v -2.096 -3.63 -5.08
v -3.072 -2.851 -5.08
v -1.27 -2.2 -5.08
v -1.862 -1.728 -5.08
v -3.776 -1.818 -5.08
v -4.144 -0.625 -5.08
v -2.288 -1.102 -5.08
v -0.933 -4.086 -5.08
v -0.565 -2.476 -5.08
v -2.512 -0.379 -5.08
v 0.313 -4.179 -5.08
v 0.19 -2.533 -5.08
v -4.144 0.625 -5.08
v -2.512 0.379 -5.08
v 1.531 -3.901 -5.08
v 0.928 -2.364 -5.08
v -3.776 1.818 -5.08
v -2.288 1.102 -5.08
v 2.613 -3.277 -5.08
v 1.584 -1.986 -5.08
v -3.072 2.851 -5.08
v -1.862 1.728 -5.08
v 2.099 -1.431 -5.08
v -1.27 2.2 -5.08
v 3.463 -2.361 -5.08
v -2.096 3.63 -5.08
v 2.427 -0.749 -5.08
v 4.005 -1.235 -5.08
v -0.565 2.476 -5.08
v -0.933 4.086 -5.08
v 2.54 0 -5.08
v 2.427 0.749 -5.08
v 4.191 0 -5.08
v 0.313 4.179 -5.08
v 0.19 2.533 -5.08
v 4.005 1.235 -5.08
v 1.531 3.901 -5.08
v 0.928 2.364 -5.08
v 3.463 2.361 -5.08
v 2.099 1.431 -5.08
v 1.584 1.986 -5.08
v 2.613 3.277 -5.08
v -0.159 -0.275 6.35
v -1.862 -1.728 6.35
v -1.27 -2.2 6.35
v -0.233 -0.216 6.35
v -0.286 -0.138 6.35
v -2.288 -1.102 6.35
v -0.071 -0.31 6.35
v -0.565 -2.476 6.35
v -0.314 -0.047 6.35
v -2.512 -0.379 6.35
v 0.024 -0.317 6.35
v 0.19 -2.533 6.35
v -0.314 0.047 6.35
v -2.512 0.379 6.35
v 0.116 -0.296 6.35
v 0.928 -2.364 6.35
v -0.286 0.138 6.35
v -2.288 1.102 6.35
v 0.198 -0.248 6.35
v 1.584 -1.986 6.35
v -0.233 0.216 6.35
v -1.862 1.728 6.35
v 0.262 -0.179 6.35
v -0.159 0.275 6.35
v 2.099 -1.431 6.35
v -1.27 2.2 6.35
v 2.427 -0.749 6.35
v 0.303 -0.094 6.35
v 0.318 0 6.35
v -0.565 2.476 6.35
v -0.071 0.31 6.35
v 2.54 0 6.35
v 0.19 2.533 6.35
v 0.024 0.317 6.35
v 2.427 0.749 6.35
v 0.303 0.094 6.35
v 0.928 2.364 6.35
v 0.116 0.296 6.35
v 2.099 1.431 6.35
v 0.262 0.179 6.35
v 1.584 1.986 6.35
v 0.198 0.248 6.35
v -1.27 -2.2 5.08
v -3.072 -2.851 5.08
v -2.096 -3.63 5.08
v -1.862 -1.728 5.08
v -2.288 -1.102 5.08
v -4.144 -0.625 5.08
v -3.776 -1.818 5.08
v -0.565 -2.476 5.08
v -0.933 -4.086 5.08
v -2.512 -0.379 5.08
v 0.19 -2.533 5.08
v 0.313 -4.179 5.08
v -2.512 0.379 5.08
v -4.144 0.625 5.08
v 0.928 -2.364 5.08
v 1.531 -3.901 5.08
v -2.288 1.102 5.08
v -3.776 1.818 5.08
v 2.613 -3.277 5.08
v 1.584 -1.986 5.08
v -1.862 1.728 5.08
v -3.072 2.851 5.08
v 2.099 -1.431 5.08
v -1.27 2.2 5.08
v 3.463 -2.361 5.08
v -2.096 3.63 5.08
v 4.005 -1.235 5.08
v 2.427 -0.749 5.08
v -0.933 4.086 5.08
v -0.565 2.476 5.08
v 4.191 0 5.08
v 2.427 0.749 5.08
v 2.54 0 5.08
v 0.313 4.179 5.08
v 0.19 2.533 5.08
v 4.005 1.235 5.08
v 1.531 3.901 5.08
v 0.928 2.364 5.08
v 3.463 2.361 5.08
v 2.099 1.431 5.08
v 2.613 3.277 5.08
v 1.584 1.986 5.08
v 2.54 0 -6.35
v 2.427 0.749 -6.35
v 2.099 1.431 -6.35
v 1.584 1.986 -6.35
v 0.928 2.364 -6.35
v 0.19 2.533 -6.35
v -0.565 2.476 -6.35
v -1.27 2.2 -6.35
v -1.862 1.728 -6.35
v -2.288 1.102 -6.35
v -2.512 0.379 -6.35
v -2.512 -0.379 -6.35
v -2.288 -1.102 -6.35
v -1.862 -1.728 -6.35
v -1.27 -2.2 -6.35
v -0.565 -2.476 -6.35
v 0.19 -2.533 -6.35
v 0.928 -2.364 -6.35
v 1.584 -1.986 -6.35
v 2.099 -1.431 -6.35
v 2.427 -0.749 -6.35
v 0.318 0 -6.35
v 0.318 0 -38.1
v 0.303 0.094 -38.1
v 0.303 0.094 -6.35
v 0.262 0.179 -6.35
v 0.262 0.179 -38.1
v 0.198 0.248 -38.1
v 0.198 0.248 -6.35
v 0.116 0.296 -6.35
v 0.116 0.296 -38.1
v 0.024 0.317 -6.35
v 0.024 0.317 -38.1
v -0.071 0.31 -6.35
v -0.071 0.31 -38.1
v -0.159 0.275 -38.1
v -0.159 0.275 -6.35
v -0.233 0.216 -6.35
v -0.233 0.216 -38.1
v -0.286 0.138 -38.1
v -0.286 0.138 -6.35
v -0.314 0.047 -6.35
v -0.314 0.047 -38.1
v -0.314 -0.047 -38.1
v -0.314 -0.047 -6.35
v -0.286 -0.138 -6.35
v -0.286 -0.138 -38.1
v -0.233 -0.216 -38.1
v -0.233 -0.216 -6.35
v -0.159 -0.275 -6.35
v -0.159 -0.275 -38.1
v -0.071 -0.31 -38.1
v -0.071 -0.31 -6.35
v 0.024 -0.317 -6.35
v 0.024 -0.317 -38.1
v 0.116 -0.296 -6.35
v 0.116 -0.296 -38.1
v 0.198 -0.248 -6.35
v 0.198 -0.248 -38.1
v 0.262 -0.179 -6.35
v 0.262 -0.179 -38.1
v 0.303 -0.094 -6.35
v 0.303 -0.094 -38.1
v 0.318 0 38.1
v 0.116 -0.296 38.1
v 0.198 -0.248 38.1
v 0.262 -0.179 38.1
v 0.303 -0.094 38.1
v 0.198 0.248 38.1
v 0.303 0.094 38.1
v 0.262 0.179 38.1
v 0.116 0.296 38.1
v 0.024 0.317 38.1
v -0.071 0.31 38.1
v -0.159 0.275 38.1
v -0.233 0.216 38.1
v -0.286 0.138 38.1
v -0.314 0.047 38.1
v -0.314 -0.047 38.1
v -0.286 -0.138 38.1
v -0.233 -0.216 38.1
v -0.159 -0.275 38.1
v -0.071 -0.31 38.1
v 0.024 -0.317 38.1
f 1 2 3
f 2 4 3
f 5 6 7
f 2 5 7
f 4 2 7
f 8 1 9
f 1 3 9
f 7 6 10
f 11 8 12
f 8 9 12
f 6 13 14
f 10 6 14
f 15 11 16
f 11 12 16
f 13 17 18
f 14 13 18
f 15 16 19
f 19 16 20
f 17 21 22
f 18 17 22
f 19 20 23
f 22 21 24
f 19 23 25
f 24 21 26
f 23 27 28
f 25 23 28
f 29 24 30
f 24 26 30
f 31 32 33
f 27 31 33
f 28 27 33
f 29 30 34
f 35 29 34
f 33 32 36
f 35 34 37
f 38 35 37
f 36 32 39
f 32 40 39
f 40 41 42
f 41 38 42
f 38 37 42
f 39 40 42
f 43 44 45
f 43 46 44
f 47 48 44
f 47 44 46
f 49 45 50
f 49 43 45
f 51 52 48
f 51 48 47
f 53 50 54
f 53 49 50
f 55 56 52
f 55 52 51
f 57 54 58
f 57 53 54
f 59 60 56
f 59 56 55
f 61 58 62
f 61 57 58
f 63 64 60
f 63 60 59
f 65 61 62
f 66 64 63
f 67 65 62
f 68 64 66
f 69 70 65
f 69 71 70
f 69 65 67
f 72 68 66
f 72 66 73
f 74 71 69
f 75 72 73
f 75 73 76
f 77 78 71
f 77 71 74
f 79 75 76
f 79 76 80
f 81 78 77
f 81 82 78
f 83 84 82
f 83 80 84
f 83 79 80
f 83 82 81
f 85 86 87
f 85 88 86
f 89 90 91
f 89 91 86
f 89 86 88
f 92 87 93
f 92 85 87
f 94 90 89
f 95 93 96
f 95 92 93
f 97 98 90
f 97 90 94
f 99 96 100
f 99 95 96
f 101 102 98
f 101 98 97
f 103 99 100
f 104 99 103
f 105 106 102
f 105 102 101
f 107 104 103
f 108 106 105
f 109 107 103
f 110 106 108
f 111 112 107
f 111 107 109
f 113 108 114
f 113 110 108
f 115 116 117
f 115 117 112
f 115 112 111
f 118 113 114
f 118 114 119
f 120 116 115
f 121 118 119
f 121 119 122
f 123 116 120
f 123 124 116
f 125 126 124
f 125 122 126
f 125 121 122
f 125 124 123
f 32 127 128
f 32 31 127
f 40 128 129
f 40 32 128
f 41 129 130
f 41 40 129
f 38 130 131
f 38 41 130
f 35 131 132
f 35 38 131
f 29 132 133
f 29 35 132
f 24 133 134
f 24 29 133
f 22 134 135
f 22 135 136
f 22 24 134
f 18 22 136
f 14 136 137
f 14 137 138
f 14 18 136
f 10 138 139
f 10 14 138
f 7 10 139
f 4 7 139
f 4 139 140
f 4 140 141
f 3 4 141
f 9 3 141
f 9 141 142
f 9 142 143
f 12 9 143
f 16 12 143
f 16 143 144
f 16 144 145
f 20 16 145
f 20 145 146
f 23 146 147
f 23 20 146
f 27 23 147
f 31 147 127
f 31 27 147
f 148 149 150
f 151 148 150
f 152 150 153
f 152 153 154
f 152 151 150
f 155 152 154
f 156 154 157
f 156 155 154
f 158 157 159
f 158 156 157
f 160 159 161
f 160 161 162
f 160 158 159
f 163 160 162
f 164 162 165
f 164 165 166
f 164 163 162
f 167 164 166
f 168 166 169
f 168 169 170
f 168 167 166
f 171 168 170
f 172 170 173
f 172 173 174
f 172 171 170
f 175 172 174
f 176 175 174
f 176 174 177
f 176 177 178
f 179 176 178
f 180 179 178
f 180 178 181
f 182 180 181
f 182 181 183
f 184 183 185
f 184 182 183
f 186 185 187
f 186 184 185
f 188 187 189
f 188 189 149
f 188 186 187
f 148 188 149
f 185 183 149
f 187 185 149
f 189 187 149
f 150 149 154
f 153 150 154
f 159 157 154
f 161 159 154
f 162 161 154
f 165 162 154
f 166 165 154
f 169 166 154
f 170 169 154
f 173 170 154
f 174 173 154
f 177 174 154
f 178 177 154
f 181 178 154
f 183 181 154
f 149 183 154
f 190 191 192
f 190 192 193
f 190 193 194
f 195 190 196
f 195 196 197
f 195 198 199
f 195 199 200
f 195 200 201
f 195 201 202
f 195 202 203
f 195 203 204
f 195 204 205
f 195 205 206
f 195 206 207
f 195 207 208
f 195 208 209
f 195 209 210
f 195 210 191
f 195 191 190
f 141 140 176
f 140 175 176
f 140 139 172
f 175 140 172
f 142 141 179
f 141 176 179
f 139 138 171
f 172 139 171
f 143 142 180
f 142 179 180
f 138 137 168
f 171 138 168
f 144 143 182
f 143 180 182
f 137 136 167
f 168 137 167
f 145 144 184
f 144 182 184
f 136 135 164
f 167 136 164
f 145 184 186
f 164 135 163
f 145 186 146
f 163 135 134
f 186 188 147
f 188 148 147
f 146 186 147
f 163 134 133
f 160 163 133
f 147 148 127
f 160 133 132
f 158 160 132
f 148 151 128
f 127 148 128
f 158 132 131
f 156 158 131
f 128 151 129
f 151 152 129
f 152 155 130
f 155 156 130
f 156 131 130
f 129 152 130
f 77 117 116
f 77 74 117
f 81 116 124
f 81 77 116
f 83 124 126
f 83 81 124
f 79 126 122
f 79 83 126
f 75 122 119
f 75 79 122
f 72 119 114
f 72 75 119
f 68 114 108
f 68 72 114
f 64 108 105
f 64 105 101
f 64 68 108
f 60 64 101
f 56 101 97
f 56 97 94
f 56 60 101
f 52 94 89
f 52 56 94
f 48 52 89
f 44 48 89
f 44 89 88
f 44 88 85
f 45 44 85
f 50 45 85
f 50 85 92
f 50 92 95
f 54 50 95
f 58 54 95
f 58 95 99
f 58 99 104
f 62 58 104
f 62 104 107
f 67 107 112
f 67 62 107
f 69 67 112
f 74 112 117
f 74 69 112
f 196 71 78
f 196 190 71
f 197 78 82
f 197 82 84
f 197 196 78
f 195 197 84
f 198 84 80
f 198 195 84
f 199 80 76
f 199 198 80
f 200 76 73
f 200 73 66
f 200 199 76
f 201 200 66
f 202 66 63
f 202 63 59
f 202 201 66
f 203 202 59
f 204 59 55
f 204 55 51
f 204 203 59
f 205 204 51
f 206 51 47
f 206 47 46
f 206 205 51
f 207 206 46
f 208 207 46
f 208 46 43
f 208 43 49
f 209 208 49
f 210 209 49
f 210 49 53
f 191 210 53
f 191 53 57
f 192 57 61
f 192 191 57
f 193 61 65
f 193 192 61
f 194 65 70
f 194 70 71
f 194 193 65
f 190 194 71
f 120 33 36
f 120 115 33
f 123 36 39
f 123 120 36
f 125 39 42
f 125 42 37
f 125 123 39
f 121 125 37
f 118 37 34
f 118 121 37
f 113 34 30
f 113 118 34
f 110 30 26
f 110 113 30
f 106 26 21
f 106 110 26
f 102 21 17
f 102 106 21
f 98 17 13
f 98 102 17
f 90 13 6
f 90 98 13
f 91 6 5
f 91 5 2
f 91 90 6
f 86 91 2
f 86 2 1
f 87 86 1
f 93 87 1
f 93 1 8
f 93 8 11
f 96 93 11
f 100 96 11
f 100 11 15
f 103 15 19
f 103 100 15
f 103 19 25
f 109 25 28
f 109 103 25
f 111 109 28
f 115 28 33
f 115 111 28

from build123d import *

# Parameters (mm, degrees)
F0_R          = 0.3175
F1_DEPTH      = 38.1
F1_DEPTH_BACK = 38.1
F0_R_2        = 2.54
F2_DEPTH      = 6.35
F2_DEPTH_BACK = 6.35
F0_R_3        = 4.191
F3_DEPTH      = 5.08
F3_DEPTH_BACK = 5.08


with BuildPart() as f1:
    # F0 (on Top) → F1 (new body, two sides)
    with BuildSketch(Plane.XY) as f1_sk:
        Circle(F0_R)
    extrude(amount=F1_DEPTH)
    extrude(f1_sk.sketch, amount=-F1_DEPTH_BACK)

    # F0 (on Top) → F2 (join, two sides)
    with BuildSketch(Plane.XY) as f2_sk:
        Circle(F0_R_2)
        Circle(F0_R, mode=Mode.SUBTRACT)
    extrude(amount=F2_DEPTH)
    extrude(f2_sk.sketch, amount=-F2_DEPTH_BACK)

    # F0 (on Top) → F3 (join, two sides)
    with BuildSketch(Plane.XY) as f3_sk:
        Circle(F0_R_3)
        Circle(F0_R_2, mode=Mode.SUBTRACT)
    extrude(amount=F3_DEPTH)
    extrude(f3_sk.sketch, amount=-F3_DEPTH_BACK)


solid = f1.part
